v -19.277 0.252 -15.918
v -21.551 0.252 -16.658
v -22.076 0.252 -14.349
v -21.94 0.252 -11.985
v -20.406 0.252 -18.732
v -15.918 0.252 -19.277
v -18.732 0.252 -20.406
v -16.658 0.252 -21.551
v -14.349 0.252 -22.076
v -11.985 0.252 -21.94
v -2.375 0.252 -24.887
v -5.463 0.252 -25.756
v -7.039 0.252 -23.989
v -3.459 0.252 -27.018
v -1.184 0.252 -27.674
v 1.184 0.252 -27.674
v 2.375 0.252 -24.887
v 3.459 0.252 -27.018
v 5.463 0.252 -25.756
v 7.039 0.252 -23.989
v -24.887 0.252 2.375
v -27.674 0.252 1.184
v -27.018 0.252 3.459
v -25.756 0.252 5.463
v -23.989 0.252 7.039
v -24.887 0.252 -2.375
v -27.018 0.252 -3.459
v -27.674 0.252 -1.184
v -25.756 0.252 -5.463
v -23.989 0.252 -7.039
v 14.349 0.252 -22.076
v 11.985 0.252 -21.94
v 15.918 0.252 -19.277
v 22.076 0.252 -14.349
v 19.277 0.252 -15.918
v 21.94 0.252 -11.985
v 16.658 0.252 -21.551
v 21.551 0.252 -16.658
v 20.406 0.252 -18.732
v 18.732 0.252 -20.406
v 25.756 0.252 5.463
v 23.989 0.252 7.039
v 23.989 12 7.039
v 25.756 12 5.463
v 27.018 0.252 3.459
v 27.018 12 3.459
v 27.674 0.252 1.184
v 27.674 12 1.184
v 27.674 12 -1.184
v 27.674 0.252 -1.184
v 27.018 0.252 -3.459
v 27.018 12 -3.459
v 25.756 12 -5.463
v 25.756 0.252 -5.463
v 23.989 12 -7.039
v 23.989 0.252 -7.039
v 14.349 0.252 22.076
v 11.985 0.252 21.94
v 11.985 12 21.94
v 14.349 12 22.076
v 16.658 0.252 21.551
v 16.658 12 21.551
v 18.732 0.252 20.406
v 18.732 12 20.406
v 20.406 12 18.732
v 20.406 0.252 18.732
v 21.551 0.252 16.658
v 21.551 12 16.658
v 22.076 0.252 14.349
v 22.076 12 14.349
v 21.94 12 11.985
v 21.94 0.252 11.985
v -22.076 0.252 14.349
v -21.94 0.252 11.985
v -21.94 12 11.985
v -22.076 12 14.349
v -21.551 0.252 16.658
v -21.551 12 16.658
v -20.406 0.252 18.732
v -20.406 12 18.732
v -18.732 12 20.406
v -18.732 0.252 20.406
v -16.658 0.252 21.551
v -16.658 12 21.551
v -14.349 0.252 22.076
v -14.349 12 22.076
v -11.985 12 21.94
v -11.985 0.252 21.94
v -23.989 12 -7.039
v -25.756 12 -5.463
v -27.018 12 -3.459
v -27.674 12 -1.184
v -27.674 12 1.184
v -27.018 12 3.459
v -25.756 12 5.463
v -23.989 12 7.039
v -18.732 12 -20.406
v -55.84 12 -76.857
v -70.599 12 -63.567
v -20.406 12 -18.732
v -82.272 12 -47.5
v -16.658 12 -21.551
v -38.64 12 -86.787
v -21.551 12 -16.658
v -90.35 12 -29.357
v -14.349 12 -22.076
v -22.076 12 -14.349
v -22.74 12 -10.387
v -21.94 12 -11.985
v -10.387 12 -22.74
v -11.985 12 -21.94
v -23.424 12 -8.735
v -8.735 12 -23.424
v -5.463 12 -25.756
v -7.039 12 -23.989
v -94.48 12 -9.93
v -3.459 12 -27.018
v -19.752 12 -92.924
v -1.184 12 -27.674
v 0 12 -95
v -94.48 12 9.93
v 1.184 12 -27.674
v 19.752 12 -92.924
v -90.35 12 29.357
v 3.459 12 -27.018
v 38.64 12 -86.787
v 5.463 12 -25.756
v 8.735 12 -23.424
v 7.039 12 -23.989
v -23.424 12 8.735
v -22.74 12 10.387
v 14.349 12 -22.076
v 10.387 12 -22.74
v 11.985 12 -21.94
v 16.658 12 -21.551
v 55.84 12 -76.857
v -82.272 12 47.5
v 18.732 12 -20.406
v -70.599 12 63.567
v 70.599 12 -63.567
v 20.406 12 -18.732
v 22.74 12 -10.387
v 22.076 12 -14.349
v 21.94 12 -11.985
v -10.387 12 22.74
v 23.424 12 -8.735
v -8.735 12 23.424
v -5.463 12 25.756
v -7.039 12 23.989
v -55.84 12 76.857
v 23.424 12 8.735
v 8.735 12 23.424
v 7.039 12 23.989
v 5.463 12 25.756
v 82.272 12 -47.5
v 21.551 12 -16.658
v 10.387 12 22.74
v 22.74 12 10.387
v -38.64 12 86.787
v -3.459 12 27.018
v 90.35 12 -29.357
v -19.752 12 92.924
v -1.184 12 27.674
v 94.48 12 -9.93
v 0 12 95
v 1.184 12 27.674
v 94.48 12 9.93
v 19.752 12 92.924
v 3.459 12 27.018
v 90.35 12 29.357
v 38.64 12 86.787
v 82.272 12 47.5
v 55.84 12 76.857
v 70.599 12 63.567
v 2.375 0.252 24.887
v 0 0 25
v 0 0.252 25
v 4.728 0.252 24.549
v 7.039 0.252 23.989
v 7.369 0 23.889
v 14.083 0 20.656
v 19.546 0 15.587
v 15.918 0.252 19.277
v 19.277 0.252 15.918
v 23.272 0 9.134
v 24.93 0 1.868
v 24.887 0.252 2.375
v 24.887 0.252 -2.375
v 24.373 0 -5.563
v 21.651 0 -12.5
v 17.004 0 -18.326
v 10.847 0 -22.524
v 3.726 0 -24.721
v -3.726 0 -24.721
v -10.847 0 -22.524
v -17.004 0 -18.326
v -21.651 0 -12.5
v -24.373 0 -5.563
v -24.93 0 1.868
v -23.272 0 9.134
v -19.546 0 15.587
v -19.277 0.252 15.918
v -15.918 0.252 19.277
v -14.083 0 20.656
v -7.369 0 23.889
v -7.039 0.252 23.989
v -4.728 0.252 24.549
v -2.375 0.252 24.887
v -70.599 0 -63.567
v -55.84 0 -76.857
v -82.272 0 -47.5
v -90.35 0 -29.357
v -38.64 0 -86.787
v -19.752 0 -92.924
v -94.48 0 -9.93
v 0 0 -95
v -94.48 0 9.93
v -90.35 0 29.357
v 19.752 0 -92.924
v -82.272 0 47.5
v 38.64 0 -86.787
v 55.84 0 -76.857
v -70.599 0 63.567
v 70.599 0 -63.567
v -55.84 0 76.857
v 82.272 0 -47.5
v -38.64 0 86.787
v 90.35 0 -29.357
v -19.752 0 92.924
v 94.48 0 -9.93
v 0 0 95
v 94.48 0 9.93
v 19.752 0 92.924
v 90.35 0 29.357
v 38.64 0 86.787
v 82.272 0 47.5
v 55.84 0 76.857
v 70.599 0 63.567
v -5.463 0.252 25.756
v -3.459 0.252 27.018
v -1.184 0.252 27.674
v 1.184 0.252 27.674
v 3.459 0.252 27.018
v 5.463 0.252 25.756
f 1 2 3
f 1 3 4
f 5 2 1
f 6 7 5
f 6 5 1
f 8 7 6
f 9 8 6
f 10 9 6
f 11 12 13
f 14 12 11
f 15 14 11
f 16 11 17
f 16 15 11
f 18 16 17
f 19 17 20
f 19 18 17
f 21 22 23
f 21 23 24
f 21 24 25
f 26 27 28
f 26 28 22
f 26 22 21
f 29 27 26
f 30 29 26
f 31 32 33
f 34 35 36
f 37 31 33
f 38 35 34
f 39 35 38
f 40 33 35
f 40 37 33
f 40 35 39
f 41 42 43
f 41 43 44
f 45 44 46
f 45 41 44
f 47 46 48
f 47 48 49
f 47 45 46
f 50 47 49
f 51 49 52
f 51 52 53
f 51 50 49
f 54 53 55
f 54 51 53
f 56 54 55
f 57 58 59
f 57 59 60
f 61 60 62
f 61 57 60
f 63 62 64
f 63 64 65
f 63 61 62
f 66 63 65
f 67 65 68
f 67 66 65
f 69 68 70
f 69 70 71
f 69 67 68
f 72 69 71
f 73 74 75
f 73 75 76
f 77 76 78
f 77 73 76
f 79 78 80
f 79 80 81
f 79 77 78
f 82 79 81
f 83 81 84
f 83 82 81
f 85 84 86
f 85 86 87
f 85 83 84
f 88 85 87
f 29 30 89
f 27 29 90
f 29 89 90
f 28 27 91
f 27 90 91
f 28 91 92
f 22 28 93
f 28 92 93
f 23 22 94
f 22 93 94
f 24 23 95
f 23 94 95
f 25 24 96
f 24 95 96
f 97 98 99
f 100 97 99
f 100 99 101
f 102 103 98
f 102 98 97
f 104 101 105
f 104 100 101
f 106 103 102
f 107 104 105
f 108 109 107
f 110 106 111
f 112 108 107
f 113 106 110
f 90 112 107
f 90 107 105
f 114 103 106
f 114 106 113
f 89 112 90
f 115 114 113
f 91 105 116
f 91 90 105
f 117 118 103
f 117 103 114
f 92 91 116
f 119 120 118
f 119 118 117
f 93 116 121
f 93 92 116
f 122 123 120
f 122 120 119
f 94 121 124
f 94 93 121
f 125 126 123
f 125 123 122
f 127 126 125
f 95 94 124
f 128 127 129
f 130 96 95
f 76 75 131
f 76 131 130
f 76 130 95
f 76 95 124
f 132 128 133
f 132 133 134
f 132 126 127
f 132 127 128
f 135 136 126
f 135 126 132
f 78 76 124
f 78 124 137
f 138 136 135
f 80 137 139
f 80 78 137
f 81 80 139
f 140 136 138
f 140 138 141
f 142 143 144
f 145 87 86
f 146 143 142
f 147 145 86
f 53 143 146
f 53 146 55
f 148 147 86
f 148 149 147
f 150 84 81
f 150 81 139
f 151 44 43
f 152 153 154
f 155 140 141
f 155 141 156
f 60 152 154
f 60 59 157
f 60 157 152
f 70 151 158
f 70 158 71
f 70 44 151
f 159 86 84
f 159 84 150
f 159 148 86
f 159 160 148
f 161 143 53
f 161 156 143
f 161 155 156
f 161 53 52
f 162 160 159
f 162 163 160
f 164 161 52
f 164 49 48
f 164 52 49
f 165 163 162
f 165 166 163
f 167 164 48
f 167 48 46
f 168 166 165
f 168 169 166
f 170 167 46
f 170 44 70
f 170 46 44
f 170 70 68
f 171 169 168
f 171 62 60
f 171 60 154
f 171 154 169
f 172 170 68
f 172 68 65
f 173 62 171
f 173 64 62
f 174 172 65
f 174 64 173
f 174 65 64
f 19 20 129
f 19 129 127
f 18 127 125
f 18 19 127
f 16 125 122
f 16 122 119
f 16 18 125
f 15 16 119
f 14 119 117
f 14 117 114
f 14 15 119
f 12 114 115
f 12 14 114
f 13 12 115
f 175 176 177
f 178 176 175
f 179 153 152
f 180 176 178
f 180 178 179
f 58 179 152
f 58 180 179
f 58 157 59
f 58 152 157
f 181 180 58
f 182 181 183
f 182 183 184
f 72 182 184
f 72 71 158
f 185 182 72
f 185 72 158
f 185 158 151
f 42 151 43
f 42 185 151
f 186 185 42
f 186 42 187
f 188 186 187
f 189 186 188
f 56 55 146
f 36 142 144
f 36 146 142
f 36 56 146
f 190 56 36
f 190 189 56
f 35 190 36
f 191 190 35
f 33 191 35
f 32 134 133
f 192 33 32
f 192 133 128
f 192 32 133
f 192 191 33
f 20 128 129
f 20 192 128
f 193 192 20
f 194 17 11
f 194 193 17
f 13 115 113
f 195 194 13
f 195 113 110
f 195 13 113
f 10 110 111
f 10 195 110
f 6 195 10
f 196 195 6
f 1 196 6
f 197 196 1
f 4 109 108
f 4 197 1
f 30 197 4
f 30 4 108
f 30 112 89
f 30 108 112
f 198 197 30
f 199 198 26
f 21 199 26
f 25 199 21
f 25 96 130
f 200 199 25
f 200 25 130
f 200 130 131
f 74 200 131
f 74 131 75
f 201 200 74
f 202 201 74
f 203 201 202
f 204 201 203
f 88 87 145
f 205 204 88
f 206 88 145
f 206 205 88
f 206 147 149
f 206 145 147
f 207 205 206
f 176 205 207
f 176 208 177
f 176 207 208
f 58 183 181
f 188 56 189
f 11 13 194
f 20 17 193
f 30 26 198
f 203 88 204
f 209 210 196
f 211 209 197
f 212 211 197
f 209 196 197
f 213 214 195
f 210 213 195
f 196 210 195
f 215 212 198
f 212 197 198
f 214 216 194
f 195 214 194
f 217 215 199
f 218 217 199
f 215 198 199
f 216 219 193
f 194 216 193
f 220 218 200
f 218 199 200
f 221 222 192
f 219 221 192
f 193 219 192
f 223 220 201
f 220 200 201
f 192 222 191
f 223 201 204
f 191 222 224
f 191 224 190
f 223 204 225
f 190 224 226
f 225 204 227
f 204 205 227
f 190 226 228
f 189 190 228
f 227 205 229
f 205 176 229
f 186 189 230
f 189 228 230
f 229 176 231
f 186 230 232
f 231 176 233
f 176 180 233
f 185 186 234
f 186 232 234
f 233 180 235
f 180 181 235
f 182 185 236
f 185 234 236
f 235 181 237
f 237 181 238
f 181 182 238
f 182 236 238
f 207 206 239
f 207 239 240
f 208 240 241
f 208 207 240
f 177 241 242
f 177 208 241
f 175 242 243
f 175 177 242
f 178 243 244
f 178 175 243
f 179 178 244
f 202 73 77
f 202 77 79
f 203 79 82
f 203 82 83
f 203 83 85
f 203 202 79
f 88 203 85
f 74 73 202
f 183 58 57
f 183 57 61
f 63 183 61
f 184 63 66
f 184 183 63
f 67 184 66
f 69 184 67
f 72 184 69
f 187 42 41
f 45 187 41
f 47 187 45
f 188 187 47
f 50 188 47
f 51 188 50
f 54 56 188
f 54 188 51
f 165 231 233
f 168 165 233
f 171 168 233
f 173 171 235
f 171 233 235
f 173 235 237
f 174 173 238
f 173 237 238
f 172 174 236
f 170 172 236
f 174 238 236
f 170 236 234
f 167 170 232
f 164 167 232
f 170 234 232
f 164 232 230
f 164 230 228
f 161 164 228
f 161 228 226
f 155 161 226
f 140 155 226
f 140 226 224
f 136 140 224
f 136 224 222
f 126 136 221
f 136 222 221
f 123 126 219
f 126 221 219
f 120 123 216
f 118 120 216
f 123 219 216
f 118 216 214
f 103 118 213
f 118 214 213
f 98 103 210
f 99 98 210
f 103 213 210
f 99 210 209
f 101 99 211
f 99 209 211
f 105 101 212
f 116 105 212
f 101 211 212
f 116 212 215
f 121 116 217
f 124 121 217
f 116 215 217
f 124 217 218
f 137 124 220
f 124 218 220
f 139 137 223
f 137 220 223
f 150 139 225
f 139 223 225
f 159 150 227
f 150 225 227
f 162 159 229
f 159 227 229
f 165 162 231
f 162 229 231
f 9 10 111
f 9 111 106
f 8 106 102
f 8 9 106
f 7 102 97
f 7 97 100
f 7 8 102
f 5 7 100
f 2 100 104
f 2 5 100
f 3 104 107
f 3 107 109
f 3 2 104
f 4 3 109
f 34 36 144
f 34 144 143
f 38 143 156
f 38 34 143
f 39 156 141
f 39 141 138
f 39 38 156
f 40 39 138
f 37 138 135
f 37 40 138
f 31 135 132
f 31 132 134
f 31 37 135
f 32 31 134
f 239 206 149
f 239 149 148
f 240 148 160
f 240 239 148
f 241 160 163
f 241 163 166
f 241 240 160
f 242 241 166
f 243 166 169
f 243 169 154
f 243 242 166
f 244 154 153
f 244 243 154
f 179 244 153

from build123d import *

# Parameters (mm, degrees)
SKETCH1_R           = 95
BOSS_EXTRUDE1_DEPTH = 12
SKETCH2_R           = 25
CUT_EXTRUDE1_DEPTH  = 135.88513632
SKETCH3_R           = 8.457473765
CUT_EXTRUDE2_DEPTH  = 11.748282376
CIRPATTERN1_COUNT   = 8


with BuildPart() as part:
    # Sketch1 → Boss-Extrude1 (new body)
    with BuildSketch(Plane(origin=(0, 0, 0), x_dir=(1, 0, 0), z_dir=(0, 1, 0))):
        Circle(SKETCH1_R)
    extrude(amount=BOSS_EXTRUDE1_DEPTH)

    # Sketch2 → Cut-Extrude1 (cut, through all)
    with BuildSketch(Plane(origin=(0, 0, 0), x_dir=(1, 0, 0), z_dir=(0, 1, 0))):
        Circle(SKETCH2_R)
    extrude(amount=CUT_EXTRUDE1_DEPTH, mode=Mode.SUBTRACT)

    # Sketch3 → Cut-Extrude2 (cut)
    with BuildSketch(Plane(origin=(0, 12, 0), x_dir=(1, 0, 0), z_dir=(0, 1, 0))):
        with Locations((-19.300211782, 0)):
            Circle(SKETCH3_R)
    cut_extrude2 = extrude(amount=-CUT_EXTRUDE2_DEPTH, mode=Mode.SUBTRACT)

    # CirPattern1: Cut-Extrude2 ×8 about axis
    cirpattern1_axis = Axis((0, 0, 0), (0, 1, 0))
    for i in range(1, CIRPATTERN1_COUNT):
        add(cut_extrude2.rotate(cirpattern1_axis, i * 360 / CIRPATTERN1_COUNT), mode=Mode.SUBTRACT)


solid = part.part
